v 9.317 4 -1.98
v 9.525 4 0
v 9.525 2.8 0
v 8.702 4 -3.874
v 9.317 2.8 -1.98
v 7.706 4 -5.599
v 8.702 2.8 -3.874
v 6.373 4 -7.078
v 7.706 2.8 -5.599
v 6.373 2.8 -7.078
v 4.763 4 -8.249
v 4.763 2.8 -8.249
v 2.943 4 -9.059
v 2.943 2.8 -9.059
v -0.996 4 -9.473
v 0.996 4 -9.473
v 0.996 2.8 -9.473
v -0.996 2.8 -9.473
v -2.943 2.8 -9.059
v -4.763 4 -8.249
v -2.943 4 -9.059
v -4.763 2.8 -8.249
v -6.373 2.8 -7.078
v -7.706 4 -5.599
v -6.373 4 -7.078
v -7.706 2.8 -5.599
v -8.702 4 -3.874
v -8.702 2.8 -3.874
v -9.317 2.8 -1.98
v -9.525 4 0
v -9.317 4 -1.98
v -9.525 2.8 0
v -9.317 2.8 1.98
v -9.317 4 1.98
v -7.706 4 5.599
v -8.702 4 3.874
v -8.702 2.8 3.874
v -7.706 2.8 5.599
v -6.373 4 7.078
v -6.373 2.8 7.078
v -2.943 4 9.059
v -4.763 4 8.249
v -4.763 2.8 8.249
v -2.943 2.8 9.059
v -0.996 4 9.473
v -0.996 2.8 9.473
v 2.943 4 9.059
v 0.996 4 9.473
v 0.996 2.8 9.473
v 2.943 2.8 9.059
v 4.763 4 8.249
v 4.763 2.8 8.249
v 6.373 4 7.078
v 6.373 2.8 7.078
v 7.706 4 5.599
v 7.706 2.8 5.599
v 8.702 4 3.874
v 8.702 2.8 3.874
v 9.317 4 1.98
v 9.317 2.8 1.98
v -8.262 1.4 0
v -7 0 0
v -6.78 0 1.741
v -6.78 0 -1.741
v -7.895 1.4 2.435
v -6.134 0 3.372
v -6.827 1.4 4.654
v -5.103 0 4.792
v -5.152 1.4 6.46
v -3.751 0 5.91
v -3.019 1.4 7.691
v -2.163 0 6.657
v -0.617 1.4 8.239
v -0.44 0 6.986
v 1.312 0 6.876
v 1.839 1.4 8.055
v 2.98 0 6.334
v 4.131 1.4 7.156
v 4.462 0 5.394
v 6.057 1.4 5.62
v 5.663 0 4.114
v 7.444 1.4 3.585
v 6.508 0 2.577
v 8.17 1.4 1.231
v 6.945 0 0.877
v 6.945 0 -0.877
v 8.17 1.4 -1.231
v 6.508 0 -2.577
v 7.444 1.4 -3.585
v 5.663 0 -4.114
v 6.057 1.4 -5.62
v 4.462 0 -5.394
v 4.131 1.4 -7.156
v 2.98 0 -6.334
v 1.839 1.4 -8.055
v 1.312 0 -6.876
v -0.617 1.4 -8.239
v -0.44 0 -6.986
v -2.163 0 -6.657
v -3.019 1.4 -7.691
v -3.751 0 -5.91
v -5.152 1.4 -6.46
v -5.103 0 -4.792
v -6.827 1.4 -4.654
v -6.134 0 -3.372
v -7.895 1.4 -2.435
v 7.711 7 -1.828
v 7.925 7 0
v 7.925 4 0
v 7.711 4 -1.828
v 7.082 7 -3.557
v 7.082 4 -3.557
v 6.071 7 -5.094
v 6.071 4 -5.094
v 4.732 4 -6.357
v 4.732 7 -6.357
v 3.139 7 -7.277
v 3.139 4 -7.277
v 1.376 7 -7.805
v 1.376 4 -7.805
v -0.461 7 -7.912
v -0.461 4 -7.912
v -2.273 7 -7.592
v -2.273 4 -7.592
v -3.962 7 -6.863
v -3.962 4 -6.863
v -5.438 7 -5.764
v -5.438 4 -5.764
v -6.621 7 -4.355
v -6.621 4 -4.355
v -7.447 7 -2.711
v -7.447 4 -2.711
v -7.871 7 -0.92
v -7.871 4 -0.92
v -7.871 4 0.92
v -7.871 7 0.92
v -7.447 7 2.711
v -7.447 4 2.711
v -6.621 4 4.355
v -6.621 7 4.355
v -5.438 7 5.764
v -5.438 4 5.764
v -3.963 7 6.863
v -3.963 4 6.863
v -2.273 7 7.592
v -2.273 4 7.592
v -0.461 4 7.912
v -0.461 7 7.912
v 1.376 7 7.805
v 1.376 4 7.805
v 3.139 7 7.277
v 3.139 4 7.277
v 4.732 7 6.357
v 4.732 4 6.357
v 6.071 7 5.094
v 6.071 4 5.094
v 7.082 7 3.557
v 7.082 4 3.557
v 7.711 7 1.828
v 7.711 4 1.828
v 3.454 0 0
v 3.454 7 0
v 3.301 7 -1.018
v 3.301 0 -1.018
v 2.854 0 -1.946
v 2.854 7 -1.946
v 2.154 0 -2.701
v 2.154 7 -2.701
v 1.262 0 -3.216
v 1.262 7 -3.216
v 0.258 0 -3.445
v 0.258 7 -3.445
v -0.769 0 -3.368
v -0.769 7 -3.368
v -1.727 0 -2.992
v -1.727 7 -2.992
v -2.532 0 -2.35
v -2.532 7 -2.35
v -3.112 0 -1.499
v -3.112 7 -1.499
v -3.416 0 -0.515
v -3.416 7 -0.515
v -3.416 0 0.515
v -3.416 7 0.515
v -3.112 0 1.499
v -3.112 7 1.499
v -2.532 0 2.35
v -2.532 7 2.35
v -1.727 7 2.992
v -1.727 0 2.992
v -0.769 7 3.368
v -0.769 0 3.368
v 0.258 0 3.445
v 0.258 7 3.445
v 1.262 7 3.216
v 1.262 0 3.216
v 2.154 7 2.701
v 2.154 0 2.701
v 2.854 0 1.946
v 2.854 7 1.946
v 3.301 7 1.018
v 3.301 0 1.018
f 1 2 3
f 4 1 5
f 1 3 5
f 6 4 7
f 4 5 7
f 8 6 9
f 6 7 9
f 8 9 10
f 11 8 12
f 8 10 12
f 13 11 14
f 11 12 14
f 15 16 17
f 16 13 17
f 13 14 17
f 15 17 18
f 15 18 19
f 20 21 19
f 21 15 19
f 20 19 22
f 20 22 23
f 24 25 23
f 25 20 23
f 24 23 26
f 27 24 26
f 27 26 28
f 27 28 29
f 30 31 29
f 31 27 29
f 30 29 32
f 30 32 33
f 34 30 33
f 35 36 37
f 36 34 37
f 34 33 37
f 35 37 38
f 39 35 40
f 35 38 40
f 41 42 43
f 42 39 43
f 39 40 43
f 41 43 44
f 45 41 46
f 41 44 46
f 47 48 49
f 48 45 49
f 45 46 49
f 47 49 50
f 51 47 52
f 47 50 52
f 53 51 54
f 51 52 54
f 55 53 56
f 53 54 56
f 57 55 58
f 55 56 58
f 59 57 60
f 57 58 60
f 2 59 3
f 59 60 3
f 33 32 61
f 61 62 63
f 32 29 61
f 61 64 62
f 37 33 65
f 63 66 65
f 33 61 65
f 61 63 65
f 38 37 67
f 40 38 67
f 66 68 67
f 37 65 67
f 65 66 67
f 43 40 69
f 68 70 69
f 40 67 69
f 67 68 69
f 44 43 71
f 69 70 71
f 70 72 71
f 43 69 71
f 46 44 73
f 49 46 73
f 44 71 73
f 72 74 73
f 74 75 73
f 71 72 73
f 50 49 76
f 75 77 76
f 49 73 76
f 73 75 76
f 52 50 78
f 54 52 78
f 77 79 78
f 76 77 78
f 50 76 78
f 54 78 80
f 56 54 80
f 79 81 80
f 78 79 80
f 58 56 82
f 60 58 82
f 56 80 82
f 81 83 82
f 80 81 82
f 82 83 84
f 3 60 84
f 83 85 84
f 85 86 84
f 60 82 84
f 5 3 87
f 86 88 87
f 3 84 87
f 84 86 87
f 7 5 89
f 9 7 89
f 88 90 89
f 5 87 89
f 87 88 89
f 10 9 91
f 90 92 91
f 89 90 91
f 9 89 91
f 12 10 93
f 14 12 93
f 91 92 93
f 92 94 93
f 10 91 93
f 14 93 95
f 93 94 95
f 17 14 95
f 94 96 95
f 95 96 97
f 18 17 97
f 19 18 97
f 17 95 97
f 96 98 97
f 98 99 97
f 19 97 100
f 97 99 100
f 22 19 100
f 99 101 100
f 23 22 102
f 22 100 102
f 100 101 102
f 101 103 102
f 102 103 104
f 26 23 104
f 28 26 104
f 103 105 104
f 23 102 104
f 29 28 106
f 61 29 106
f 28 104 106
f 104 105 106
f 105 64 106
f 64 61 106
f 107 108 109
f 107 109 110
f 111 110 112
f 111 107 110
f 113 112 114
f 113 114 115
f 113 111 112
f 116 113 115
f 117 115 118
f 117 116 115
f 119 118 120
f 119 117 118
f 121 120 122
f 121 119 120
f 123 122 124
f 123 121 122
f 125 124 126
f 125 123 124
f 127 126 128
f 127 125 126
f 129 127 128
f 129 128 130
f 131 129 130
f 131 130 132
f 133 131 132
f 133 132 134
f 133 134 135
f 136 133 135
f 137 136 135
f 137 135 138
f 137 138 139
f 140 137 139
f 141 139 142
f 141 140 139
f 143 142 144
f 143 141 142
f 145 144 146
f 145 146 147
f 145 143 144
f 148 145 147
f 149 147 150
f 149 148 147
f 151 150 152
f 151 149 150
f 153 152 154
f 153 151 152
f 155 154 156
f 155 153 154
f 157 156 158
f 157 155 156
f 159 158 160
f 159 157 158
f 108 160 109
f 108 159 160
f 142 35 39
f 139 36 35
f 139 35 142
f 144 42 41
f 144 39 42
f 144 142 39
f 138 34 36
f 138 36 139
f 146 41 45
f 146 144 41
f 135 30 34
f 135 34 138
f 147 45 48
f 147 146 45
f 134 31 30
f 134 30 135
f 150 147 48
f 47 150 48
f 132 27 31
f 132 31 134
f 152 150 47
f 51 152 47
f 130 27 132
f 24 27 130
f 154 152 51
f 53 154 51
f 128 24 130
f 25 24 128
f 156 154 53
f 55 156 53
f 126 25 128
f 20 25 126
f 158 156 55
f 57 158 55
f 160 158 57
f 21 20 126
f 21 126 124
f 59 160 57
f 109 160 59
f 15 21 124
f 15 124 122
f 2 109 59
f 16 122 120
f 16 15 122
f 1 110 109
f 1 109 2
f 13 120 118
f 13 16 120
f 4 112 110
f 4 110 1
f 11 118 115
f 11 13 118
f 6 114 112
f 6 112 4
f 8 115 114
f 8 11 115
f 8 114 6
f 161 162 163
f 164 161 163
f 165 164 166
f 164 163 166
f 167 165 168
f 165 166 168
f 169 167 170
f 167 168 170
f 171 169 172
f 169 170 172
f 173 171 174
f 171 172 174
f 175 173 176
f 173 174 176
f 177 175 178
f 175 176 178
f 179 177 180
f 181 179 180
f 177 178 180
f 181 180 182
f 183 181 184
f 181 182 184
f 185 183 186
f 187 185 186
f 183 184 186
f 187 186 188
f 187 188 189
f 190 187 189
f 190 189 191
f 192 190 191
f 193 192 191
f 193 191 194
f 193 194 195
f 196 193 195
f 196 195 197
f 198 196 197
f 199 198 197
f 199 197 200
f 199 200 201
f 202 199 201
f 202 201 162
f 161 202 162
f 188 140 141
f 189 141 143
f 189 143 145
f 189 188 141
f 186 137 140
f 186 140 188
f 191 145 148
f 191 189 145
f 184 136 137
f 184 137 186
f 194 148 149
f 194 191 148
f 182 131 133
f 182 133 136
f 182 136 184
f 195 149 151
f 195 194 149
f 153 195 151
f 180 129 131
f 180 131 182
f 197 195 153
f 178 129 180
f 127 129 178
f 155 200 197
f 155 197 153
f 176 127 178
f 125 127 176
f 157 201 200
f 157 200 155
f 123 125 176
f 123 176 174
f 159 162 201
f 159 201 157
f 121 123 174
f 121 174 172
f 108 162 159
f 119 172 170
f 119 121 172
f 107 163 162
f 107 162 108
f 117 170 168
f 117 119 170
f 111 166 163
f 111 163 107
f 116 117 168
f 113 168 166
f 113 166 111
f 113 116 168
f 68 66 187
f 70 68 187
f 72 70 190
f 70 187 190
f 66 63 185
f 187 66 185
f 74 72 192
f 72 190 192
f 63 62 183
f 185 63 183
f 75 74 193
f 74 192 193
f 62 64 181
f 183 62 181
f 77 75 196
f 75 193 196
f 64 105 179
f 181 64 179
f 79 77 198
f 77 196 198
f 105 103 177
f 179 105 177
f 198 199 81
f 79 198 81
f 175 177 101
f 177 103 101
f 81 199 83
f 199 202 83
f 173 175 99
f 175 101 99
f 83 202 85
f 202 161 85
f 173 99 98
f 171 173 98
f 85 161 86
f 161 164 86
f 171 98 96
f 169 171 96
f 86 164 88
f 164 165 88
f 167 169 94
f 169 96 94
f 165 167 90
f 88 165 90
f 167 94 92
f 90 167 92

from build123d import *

# Parameters (mm, degrees)
SKETCH1_R                = 9.525
EXTRUDE1_DEPTH           = 7
F_5_16_24_TAPPED_HOLE1_D = 6.9088
SKETCH3_OUTSIDE_W        = 26.618
SKETCH3_OUTSIDE_H        = 26.618
SKETCH3_OUTSIDE_R        = 7.925
EXTRUDE3_DEPTH           = 3


with BuildPart() as part:
    # Sketch1 → Extrude1 (new body)
    with BuildSketch(Plane(origin=(0, 0, 0), x_dir=(1, 0, 0), z_dir=(0, 1, 0))):
        Circle(SKETCH1_R)
    extrude(amount=EXTRUDE1_DEPTH)

    # 5/16-24 Tapped Hole1 (through all)
    with Locations(Plane(origin=(0, 0, 0), x_dir=(-1, 0, 0), z_dir=(0, -1, 0))):
        with Locations((0, 0)):
            Hole(F_5_16_24_TAPPED_HOLE1_D / 2)

    # Sketch3 outside → Extrude3 (cut)
    with BuildSketch(Plane(origin=(0, 7, 0), x_dir=(1, 0, 0), z_dir=(0, 1, 0))):
        Rectangle(SKETCH3_OUTSIDE_W, SKETCH3_OUTSIDE_H)
        Circle(SKETCH3_OUTSIDE_R, mode=Mode.SUBTRACT)
    extrude(amount=-EXTRUDE3_DEPTH, mode=Mode.SUBTRACT)

    # Sketch6 → Cut-Revolve1 (revolve, cut)
    with BuildSketch(Plane.XY):
        Polygon((-9.525, 2.8), (-7, 0), (-7, -3.811390031), (-11.858524977, -3.811390031), (-11.858524977, 2.8), align=None)
    revolve(axis=Axis((0, 0, 0), (0, 1, 0)), mode=Mode.SUBTRACT)


solid = part.part
